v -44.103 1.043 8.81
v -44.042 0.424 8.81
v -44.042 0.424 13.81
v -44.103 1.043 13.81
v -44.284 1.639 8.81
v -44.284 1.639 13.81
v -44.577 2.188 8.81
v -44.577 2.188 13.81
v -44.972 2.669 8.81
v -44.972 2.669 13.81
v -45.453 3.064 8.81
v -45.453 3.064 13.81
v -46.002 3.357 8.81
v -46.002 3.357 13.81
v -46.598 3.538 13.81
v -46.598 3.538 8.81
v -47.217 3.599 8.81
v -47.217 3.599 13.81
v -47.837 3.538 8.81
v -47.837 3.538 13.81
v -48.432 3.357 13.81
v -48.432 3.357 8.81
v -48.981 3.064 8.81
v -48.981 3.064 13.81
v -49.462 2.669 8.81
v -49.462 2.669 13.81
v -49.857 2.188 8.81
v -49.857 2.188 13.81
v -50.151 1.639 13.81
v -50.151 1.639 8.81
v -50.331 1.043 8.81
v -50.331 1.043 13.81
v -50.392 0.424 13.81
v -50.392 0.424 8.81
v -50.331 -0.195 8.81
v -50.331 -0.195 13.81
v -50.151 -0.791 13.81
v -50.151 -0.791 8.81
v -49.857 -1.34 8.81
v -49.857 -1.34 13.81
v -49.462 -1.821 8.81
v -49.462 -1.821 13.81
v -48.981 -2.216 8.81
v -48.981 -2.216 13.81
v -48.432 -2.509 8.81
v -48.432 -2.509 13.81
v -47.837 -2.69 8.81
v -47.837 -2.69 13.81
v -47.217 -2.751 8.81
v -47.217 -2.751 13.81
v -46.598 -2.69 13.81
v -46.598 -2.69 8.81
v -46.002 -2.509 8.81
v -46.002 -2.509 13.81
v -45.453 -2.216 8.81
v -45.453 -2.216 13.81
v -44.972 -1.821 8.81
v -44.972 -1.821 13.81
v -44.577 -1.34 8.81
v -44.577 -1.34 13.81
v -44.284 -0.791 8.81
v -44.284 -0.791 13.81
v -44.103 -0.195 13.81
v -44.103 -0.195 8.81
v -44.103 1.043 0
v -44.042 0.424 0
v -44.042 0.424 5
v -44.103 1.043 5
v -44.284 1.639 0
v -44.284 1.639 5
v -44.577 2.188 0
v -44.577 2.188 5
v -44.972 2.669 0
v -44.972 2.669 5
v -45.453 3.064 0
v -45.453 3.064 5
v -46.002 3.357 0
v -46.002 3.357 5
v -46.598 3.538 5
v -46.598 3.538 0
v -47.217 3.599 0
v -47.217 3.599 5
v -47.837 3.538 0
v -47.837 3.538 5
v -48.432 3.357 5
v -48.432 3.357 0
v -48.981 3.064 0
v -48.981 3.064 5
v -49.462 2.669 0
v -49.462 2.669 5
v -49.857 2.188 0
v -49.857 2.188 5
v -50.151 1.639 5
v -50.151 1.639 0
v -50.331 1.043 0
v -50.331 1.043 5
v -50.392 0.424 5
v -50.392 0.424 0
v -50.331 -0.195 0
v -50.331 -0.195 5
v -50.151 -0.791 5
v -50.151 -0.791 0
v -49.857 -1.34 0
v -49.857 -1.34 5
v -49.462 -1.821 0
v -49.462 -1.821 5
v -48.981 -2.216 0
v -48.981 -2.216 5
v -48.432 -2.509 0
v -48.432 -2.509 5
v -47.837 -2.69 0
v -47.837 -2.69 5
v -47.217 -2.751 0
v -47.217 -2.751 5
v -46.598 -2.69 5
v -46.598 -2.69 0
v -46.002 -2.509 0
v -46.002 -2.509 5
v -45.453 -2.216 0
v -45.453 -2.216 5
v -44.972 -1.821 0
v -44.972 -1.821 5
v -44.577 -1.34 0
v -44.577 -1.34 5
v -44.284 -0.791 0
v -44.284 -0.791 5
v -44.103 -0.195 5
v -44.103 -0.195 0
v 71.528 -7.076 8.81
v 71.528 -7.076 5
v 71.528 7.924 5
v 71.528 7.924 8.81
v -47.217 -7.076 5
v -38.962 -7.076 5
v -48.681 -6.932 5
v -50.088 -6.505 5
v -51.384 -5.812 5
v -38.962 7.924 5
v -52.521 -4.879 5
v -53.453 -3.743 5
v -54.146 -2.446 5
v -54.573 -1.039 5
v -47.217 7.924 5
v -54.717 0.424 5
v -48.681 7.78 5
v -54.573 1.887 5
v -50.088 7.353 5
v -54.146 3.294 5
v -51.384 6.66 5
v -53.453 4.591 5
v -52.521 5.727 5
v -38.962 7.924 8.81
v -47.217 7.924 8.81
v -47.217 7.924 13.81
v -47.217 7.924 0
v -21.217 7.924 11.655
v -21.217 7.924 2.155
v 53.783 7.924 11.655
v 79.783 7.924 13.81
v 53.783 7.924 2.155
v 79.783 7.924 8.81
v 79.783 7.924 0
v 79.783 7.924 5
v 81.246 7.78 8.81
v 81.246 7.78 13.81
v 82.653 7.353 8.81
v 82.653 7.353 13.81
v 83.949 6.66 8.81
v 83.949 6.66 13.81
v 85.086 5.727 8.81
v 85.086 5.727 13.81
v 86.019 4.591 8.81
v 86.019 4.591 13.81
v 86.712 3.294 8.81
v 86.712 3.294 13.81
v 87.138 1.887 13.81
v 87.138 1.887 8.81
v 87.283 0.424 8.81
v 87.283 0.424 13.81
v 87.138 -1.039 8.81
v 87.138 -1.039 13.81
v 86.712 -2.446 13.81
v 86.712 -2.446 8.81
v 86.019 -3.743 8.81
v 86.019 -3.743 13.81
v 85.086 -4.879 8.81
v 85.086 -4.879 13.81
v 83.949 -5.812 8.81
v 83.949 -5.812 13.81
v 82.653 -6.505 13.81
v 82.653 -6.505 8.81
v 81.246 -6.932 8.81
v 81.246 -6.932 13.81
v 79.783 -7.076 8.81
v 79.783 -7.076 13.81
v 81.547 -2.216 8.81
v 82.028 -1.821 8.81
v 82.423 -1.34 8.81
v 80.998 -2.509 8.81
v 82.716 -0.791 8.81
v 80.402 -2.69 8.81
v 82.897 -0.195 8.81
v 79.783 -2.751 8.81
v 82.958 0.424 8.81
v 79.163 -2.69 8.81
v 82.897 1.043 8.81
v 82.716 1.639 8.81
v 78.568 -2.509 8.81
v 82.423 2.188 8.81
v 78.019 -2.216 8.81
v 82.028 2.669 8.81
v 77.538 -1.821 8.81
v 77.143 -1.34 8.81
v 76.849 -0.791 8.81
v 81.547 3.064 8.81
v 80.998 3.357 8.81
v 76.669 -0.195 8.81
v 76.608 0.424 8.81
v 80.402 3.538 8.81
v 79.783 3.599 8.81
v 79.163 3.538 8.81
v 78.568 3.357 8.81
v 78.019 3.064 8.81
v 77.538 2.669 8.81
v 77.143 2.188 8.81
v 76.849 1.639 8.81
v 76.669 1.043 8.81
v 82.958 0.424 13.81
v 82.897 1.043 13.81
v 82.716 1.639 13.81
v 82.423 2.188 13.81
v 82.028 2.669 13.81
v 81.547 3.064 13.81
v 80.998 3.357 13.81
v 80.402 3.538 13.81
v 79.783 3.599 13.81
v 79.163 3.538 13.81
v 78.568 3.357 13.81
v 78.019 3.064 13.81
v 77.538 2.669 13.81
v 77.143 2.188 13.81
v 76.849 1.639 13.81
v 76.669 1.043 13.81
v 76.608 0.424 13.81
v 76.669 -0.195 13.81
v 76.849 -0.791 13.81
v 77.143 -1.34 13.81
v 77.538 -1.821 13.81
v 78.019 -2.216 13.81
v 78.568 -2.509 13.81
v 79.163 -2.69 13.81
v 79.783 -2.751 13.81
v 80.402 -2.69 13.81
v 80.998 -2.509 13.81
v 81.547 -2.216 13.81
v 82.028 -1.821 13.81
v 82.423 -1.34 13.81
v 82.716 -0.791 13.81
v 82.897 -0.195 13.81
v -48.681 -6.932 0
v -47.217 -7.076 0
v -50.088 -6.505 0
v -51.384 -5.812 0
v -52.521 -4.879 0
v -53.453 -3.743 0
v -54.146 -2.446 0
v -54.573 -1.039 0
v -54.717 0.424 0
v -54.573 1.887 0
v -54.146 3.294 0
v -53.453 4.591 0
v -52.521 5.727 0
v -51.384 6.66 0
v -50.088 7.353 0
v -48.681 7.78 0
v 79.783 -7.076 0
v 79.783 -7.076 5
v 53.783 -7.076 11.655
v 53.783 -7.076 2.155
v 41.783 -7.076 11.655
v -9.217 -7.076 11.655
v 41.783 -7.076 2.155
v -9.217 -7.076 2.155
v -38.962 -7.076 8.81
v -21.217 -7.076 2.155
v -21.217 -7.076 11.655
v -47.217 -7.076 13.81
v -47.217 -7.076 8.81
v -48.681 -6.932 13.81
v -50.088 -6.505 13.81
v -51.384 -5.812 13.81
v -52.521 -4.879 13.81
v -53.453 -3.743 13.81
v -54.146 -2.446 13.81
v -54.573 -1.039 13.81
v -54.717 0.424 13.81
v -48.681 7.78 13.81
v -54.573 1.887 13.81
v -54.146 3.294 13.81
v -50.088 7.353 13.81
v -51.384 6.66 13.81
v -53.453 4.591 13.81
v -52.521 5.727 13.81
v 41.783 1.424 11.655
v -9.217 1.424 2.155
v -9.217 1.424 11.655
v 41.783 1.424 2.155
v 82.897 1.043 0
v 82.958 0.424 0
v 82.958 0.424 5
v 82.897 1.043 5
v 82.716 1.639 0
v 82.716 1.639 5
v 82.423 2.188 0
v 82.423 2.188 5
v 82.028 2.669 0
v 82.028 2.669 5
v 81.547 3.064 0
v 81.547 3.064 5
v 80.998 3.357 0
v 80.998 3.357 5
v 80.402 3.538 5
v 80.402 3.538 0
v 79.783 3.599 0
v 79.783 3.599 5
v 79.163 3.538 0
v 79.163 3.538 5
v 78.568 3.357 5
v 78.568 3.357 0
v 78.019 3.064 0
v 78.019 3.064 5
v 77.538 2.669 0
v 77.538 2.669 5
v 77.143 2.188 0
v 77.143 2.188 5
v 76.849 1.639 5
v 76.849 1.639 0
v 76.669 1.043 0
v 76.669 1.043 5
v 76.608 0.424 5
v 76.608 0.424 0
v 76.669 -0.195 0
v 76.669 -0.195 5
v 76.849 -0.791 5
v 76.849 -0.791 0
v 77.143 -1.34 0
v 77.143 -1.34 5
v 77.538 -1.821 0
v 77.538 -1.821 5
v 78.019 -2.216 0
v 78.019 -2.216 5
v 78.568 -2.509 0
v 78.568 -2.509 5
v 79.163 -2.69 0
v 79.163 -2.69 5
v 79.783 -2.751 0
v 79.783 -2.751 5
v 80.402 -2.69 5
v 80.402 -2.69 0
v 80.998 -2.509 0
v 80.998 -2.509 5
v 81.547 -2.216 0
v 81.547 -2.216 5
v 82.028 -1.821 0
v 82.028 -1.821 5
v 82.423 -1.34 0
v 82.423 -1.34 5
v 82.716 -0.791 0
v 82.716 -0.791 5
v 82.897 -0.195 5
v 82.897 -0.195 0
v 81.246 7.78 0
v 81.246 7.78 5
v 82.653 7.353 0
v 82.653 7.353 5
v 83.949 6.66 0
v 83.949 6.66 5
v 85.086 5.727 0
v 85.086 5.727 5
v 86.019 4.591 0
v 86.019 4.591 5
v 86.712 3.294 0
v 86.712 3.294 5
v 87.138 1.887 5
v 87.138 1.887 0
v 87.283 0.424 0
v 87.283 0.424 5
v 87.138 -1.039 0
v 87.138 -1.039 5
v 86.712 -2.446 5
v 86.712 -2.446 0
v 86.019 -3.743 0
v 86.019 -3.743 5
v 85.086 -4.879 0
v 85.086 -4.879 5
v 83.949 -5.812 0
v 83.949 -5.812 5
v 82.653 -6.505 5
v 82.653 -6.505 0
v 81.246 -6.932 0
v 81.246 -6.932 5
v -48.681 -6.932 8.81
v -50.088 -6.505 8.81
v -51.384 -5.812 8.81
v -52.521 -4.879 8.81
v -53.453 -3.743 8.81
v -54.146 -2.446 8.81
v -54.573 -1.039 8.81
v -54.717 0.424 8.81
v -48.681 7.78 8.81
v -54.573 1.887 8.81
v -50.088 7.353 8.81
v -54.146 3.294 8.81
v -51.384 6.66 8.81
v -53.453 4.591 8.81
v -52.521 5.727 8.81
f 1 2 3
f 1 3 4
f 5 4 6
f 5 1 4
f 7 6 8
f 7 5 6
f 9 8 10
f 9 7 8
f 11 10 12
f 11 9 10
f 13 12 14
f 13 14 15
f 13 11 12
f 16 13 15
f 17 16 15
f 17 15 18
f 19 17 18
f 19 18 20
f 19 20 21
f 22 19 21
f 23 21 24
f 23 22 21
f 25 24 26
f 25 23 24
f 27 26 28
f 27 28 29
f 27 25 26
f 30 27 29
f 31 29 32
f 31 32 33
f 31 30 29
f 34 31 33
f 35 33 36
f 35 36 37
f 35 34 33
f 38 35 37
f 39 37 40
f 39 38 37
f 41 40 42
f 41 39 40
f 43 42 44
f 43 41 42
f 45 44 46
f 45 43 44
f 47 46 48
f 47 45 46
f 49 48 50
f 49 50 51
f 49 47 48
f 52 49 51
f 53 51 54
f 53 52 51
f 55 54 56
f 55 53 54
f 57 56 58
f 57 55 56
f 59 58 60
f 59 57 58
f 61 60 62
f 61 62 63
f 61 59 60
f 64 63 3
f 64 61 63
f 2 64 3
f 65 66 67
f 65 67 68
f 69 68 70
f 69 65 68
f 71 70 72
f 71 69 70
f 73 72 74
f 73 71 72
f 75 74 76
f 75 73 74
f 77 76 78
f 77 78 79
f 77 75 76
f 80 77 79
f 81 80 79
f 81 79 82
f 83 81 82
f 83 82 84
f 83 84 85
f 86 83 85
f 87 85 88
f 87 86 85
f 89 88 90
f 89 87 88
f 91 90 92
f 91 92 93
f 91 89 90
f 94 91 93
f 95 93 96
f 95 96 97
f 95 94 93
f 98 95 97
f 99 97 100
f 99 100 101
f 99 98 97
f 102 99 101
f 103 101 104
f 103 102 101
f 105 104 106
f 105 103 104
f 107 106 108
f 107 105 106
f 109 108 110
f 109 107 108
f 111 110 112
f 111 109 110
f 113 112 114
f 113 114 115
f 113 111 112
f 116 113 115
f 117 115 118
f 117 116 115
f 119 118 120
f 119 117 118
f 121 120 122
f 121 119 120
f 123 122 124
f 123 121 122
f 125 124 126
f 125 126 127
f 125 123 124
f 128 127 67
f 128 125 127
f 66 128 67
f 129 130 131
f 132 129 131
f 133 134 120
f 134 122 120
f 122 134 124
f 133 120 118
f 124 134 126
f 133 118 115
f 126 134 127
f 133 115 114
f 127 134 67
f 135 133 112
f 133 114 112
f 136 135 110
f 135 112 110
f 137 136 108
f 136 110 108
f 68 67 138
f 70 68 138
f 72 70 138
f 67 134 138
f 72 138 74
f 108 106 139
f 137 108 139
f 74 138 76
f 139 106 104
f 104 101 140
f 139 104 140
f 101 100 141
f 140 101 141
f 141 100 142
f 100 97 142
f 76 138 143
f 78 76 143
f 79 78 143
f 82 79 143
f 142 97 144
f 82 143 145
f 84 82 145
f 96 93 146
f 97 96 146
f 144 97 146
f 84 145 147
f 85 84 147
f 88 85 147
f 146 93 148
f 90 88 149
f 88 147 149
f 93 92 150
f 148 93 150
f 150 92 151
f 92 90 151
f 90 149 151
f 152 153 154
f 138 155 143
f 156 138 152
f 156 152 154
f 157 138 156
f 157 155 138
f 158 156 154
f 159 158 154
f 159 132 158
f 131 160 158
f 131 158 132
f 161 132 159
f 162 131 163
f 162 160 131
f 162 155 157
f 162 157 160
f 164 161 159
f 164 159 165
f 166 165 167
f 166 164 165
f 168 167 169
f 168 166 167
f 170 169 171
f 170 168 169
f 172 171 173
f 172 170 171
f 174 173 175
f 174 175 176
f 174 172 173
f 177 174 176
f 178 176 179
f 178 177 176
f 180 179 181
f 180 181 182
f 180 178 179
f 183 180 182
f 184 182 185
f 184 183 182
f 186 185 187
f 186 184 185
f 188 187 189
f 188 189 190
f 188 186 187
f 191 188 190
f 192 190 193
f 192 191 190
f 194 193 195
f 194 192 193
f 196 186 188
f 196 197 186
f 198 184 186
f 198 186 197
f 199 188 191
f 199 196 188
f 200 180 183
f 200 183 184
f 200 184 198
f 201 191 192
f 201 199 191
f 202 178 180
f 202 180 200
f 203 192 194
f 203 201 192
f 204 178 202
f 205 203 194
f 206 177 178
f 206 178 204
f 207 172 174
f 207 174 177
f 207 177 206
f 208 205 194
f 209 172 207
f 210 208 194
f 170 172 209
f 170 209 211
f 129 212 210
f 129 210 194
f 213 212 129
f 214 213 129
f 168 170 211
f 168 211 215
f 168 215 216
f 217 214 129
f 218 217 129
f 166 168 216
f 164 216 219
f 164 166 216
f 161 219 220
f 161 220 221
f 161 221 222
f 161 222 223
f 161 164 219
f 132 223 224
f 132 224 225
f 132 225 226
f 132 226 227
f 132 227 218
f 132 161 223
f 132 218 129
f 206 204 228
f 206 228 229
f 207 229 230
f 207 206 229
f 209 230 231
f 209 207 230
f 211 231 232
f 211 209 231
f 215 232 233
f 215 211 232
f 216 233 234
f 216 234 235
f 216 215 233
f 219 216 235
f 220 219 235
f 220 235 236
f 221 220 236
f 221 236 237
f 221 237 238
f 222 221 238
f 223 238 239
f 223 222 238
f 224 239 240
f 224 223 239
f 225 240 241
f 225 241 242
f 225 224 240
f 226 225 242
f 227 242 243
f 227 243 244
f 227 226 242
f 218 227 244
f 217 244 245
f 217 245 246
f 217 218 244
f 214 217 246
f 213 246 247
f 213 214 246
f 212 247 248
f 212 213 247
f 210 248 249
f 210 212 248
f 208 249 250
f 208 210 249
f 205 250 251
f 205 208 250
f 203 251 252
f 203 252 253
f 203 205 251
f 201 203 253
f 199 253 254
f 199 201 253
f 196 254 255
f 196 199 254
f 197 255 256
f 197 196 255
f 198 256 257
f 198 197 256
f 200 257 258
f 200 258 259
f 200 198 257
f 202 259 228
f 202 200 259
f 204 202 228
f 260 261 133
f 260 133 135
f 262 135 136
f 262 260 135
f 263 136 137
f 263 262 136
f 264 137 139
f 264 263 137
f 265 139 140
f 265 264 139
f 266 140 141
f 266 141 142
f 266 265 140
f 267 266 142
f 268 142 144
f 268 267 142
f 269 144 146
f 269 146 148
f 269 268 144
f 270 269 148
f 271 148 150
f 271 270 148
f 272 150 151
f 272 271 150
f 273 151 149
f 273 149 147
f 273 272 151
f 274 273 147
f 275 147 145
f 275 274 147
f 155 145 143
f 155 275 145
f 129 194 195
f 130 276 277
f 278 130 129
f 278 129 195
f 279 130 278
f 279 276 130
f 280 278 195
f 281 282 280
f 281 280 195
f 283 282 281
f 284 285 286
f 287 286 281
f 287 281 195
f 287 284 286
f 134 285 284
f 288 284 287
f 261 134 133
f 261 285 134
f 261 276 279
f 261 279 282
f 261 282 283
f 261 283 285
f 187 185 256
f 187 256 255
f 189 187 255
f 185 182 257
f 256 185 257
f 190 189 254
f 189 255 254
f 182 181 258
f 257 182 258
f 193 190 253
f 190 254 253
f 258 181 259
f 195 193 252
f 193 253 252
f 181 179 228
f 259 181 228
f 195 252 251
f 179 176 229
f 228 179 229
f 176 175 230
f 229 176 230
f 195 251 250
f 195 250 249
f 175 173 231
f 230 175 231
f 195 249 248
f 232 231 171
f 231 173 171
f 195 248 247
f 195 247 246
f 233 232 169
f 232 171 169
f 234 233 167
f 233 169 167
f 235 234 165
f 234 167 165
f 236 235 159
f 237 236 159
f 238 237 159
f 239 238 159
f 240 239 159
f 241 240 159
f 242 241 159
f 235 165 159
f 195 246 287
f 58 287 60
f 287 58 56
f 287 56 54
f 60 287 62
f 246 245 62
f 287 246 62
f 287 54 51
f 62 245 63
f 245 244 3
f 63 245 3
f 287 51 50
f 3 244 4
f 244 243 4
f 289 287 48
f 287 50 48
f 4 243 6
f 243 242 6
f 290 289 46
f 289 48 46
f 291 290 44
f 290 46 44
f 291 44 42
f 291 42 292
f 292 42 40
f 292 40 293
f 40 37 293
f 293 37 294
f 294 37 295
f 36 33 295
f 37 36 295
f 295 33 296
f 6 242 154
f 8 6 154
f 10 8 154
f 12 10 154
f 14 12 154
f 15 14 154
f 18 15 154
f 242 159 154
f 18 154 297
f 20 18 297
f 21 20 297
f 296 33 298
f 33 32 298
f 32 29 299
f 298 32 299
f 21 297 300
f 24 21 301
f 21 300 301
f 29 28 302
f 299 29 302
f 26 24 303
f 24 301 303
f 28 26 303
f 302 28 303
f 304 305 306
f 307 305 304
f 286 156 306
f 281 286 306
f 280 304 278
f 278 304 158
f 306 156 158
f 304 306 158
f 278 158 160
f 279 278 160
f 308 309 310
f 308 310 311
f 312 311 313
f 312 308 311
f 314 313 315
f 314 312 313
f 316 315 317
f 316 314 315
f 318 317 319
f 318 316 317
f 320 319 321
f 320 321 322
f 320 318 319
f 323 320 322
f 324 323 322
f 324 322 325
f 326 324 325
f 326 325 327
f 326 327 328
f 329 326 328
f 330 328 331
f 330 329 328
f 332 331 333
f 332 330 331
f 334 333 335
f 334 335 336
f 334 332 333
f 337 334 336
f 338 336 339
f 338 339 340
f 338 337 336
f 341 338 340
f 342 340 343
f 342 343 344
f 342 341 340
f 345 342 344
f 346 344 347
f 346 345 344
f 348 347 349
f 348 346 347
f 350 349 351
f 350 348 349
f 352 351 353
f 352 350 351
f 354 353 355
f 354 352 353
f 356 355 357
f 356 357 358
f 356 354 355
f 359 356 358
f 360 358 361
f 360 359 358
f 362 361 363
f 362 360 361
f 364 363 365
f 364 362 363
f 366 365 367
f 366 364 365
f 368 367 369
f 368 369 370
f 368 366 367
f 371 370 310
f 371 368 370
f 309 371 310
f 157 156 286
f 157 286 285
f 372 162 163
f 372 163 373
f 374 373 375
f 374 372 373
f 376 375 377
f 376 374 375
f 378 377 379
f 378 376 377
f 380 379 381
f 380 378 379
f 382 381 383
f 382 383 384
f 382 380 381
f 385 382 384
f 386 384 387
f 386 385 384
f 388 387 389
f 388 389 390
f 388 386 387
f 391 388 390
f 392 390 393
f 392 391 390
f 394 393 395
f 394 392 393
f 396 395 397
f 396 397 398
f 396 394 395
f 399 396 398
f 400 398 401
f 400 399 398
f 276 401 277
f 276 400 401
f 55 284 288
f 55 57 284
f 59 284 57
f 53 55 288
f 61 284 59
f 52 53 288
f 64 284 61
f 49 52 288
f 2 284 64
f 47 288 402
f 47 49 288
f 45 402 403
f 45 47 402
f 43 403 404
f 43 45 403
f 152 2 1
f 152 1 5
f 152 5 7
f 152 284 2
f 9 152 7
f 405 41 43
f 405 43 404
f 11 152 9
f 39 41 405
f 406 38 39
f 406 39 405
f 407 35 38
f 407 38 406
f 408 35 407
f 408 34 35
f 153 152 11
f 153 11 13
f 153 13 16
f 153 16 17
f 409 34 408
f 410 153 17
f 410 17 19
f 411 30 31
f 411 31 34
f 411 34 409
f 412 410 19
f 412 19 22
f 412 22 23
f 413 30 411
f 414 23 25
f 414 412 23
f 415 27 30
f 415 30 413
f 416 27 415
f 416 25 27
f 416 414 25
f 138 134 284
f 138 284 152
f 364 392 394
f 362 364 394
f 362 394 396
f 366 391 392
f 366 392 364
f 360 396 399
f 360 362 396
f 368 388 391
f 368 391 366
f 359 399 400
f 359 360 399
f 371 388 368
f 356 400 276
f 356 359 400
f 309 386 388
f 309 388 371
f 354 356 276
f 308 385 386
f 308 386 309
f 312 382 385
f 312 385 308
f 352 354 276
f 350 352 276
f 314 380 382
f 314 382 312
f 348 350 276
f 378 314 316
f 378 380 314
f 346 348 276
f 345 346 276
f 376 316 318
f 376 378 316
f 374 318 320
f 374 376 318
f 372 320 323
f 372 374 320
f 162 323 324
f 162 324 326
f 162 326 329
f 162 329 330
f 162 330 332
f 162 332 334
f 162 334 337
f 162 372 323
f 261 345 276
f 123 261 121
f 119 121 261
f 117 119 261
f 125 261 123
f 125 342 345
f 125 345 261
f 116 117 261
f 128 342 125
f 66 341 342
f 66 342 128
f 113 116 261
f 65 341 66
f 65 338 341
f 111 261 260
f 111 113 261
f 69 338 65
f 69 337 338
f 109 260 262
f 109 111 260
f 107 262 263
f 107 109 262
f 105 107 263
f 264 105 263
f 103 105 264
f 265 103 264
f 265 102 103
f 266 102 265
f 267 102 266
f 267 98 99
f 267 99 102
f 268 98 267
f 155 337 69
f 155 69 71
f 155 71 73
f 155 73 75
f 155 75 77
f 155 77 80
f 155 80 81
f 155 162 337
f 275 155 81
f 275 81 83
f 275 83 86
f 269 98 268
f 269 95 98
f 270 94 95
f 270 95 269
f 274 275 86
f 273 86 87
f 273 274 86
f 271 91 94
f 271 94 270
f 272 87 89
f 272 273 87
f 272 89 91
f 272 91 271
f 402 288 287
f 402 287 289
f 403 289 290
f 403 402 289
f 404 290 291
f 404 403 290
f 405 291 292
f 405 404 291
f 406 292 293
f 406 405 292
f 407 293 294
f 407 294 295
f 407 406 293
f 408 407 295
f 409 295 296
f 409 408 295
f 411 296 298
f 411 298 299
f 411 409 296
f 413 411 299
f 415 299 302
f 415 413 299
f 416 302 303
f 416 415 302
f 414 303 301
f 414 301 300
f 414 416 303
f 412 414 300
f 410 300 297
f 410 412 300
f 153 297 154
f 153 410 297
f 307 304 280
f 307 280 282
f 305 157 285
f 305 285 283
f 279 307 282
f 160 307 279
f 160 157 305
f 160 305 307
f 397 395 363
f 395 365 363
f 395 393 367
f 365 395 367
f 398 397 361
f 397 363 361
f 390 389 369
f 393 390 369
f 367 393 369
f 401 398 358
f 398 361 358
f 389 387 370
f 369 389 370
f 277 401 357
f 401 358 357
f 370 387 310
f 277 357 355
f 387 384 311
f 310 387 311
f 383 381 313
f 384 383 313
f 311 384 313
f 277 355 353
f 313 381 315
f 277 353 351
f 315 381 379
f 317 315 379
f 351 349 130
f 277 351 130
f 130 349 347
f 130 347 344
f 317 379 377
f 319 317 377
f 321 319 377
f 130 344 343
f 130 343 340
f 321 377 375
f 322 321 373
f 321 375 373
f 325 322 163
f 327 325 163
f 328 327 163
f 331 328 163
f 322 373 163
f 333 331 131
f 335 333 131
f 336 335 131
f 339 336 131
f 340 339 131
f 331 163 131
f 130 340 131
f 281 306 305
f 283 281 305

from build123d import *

# Parameters (mm, degrees)
SKETCH1_R           = 3.175
BOSS_EXTRUDE1_DEPTH = 5
SKETCH2_W           = 110.49
SKETCH2_H           = 15
BOSS_EXTRUDE2_DEPTH = 3.81
SKETCH5_R           = 3.175
BOSS_EXTRUDE3_DEPTH = 5
SKETCH6_W           = 75
SKETCH6_H           = 9.5
CUT_EXTRUDE1_DEPTH  = 6.5
SKETCH7_W           = 12
SKETCH7_H           = 9.5
CUT_EXTRUDE2_DEPTH  = 9.294


with BuildPart() as part:
    # Sketch1 → Boss-Extrude1 (new body)
    with BuildSketch(Plane.XY):
        with BuildLine():
            Line((-47.217391304, 7.923913043), (79.782608696, 7.923913043))
            ThreePointArc((79.782608696, 7.923913043), (87.282608696, 0.423913043), (79.782608696, -7.076086957))
            Line((79.782608696, -7.076086957), (-47.217391304, -7.076086957))
            ThreePointArc((-47.217391304, -7.076086957), (-54.717391304, 0.423913043), (-47.217391304, 7.923913043))
        make_face()
        with Locations((-47.217391304, 0.423913043)):
            Circle(SKETCH1_R, mode=Mode.SUBTRACT)
        with Locations((79.782608696, 0.423913043)):
            Circle(SKETCH1_R, mode=Mode.SUBTRACT)
    extrude(amount=BOSS_EXTRUDE1_DEPTH)

    # Sketch2 → Boss-Extrude2 (add)
    with BuildSketch(Plane.XY.offset(5)):
        with Locations((16.282608696, 0.423913043)):
            Rectangle(SKETCH2_W, SKETCH2_H)
    extrude(amount=BOSS_EXTRUDE2_DEPTH)

    # Sketch5 → Boss-Extrude3 (add)
    with BuildSketch(Plane.XY.offset(8.81)):
        with BuildLine():
            Line((-47.217391304, 7.923913043), (79.782608696, 7.923913043))
            ThreePointArc((79.782608696, 7.923913043), (87.282608696, 0.423913043), (79.782608696, -7.076086957))
            Line((79.782608696, -7.076086957), (-47.217391304, -7.076086957))
            ThreePointArc((-47.217391304, -7.076086957), (-54.717391304, 0.423913043), (-47.217391304, 7.923913043))
        make_face()
        with Locations((-47.217391304, 0.423913043)):
            Circle(SKETCH5_R, mode=Mode.SUBTRACT)
        with Locations((79.782608696, 0.423913043)):
            Circle(SKETCH5_R, mode=Mode.SUBTRACT)
    extrude(amount=BOSS_EXTRUDE3_DEPTH)

    # Sketch6 → Cut-Extrude1 (cut)
    with BuildSketch(Plane(origin=(0, 7.923913043, 0), x_dir=(1, 0, 0), z_dir=(0, 1, 0))):
        with Locations((16.282608696, -6.905)):
            Rectangle(SKETCH6_W, SKETCH6_H)
    extrude(amount=-CUT_EXTRUDE1_DEPTH, mode=Mode.SUBTRACT)

    # Sketch7 → Cut-Extrude2 (cut)
    with BuildSketch(Plane(origin=(0, 1.423913043, 0), x_dir=(1, 0, 0), z_dir=(0, 1, 0))):
        with Locations((-15.217391304, -6.905)):
            Rectangle(SKETCH7_W, SKETCH7_H)
        with Locations((47.782608696, -6.905)):
            Rectangle(SKETCH7_W, SKETCH7_H)
    extrude(amount=-CUT_EXTRUDE2_DEPTH, mode=Mode.SUBTRACT)


solid = part.part
